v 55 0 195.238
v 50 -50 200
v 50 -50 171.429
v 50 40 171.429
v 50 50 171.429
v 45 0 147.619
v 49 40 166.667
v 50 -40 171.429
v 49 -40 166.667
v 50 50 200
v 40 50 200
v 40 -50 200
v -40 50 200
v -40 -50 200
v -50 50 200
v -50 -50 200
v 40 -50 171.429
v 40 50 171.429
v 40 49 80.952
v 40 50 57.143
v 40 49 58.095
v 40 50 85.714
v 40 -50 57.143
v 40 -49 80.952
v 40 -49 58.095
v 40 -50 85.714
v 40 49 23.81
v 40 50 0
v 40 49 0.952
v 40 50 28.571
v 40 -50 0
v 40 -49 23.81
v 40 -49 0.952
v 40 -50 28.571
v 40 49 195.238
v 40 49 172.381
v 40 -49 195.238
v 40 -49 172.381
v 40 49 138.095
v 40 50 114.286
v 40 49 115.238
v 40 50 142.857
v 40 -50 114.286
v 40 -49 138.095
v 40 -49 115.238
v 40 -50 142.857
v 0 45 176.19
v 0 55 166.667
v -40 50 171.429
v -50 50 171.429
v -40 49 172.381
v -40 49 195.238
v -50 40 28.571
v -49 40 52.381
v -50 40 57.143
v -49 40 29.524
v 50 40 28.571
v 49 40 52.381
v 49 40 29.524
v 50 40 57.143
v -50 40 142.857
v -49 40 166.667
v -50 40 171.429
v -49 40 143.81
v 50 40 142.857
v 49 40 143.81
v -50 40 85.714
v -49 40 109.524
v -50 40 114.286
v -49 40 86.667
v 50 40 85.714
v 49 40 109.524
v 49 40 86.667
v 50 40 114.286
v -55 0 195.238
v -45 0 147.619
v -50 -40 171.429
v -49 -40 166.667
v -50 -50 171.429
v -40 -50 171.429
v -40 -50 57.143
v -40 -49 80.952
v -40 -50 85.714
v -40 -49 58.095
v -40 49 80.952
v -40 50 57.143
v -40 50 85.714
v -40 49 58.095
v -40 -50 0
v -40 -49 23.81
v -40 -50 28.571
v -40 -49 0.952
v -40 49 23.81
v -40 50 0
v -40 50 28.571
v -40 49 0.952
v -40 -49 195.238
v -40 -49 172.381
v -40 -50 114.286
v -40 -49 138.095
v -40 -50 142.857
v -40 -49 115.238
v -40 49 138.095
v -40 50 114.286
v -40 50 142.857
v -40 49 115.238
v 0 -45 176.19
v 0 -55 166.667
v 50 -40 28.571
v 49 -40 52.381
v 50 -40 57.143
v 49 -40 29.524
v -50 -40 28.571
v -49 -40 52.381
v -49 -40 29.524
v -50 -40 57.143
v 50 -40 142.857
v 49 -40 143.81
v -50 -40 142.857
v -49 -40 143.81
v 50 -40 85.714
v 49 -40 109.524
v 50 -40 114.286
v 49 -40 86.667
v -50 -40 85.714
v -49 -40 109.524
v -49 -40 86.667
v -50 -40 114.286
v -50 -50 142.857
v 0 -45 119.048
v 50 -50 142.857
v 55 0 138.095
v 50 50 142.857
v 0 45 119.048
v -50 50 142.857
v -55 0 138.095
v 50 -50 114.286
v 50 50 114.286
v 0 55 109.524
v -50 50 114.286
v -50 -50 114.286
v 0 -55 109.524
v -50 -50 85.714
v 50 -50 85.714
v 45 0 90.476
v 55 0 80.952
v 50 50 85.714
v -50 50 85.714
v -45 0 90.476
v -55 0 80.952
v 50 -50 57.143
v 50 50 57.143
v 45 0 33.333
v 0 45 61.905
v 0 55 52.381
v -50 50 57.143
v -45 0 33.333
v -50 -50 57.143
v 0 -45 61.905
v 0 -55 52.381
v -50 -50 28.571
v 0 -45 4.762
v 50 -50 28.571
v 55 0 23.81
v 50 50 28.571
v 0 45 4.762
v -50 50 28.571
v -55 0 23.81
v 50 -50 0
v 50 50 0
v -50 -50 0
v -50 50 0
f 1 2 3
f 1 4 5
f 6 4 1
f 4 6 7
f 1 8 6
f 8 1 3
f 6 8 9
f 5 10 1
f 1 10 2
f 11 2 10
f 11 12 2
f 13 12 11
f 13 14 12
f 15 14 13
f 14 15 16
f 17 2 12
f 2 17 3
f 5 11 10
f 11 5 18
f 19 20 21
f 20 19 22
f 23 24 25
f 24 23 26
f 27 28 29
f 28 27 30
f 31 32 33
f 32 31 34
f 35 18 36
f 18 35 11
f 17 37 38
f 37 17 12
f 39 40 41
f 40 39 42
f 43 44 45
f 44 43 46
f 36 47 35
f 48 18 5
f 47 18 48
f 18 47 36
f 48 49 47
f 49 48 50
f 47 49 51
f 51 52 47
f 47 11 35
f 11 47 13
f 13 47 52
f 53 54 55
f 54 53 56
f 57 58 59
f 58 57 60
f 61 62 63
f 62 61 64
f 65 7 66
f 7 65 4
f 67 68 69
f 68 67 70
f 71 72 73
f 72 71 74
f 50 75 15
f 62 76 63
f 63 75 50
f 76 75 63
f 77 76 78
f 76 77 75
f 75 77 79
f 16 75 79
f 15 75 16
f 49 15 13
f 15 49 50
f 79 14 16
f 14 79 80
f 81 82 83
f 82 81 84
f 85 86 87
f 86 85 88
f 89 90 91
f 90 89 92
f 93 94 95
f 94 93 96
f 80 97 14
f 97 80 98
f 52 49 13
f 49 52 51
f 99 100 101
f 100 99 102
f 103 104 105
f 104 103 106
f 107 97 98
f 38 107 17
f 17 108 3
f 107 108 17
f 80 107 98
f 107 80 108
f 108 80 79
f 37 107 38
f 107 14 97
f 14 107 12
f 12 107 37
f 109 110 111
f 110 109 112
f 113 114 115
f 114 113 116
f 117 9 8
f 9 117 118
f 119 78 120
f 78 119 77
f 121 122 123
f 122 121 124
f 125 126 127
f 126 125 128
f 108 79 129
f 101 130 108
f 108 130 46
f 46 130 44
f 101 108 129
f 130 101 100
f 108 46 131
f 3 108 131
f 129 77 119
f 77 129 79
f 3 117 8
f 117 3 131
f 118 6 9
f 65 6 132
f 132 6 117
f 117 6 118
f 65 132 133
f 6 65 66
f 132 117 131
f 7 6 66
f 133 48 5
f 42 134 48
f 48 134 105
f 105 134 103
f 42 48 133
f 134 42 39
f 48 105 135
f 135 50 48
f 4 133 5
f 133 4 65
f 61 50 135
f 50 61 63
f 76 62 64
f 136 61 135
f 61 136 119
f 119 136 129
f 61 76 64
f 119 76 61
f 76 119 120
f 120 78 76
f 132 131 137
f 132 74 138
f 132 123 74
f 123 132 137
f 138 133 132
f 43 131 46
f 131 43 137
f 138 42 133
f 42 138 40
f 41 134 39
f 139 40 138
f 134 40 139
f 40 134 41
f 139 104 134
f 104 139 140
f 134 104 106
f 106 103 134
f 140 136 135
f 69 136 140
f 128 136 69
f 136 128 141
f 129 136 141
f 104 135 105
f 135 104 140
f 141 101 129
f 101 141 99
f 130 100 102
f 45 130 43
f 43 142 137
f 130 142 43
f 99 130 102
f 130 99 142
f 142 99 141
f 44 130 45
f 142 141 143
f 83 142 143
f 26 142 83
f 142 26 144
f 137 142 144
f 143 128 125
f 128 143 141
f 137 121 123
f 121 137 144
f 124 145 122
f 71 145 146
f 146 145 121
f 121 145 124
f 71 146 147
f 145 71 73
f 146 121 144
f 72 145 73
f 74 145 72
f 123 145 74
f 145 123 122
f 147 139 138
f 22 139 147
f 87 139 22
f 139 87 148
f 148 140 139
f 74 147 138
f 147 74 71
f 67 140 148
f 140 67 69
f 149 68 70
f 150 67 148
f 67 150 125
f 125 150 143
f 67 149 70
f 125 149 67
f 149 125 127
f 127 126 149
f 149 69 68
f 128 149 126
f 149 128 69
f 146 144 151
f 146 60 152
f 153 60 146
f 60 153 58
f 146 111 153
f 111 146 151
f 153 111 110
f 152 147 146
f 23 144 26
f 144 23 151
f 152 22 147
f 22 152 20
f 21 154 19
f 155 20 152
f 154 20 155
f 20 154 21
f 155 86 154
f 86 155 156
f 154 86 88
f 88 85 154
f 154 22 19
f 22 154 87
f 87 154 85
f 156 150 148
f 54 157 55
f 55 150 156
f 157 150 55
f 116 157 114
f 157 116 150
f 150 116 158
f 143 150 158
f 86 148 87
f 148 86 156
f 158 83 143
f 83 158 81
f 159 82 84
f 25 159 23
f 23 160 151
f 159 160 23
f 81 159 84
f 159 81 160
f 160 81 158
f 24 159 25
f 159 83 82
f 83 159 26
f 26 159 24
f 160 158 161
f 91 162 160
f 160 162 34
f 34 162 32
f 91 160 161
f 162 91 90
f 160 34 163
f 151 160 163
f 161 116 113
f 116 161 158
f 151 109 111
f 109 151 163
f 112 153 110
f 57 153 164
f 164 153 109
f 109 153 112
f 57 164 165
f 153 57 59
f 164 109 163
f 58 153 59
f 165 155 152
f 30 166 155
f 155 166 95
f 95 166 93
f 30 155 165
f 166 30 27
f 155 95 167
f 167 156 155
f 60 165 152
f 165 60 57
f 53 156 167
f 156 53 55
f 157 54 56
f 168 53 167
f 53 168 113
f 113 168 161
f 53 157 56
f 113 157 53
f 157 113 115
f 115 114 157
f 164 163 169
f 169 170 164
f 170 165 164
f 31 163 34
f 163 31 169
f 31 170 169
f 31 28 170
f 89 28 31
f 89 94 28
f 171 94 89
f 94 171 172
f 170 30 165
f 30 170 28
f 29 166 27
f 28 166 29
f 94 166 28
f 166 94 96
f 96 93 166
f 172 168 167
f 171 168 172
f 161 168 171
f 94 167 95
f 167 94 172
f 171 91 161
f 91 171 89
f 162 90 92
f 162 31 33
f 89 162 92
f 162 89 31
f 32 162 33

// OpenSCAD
radius = 50;// Approximate radius of lampshade body.
height = 200;// Height of the lamp body
layers = 7; // Number of layers
cells_per_layer = 4; // Number of cells per layer

// Ratio of lump in cell. Ratio: 1/socket_ratio
cell_lump_height_ratio = 6;
// Depth of the lumpos. r/cell_lump_depth_ratio
cell_lump_depth_ratio = 10;

bholediameter = 50;// Hole in the bottom to mount the lamp:
bholeheight = 0.8;// For vase mode, set bholeheight to the same setting as the bottom layer.

// Height-ratio of socket to shade. Ratio: 1/socket_ratio
socket_ratio = 7.3;

//---------------------------- internal stuff below, change at your own risk ----------------------------//

cell_angle = 360 / (cells_per_layer / 2); // Degrees by which each cell is rotated, relative to the last one of its type
cell_width = radius * tan(cell_angle / 4);
cell_depth = -10; // Depth of the polyhedron (but only the cuboid part, without the dent)
cell_height = height / layers;
cell_lump = cell_height / cell_lump_height_ratio;

cylinder_rotation = (cells_per_layer % 4 == 0) ?
    (360 / cells_per_layer / 2) :
        ((cells_per_layer % 4 == 2) ? 0 : -90);

cylinder_radius = (radius + cell_depth) / cos(180 / cells_per_layer);

// Stuff for the slanted top where shade and socket come together
//cone_radius = radius + ((socket_ratio - 1) * height / socket_ratio / tan(60));
cone_height = height / socket_ratio + tan(60) * (radius - height / socket_ratio / tan(60));

// Coordinates of vertices that describe the polyhedron with the outward facing lump
p1 = [
        [cell_width, 0, 0], //0
        [-cell_width, 0, 0], //1
        [-cell_width, 0, cell_height], //2
        [cell_width, 0, cell_height], //3
        [0, radius / cell_lump_depth_ratio, cell_lump], //4
        [cell_width, cell_depth, 0], //5
        [-cell_width, cell_depth, 0], //6
        [-cell_width, cell_depth, cell_height], //7
        [cell_width, cell_depth, cell_height], //8
    ];

// Coordinates of vertices that describe the polyhedron with the inward facing lump
p2 = [
        [cell_width, 0, 0], //0
        [-cell_width, 0, 0], //1
        [-cell_width, 0, cell_height], //2
        [cell_width, 0, cell_height], //3
        [0, -radius / cell_lump_depth_ratio, cell_height - cell_lump], //4
        [cell_width, cell_depth, 0], //5
        [-cell_width, cell_depth, 0], //6
        [-cell_width, cell_depth, cell_height], //7
        [cell_width, cell_depth, cell_height], //8
    ];

// Vertices that the faces should connect
faces = [
        [1, 2, 4],
        [2, 3, 4],
        [0, 4, 3],
        [0, 1, 4],
        [0, 5, 6, 1],
        [1, 6, 7, 2],
        [3, 2, 7, 8],
        [0, 3, 8, 5],
        [8, 7, 6, 5]
    ];

module placeCell(rotation, vertices, height) {
    translate([sin(rotation) * radius, cos(rotation) * radius, height]) {
        // Single segment
        rotate([0, 0, -rotation])
            polyhedron(vertices, faces, 4);
    }
}

module placeLayer(current_z, offset) {
    for (current_degree = [0:cell_angle / 2:360]) {

        // Every other iteration
        if ((current_degree / cell_angle) % 1 == 0) {
            placeCell(current_degree + offset, p1, current_z);
        } else {
            placeCell(current_degree + offset, p2, current_z);
        }
    }
}

module wholeShade() {
    translate([0, 0, height])
        rotate([180, 0, 0])
            union() {
                rotate([0, 0, cylinder_rotation])
                    cylinder(r = cylinder_radius, h = height, $fn = cells_per_layer);

                for (i = [0:1:layers - 1]) {
                    current_z = i * cell_height;
                    // Every other iteration
                    if (i % 2 == 0) {
                        placeLayer(current_z, cell_angle / 2);
                    } else {
                        placeLayer(current_z, 0);
                    }
                }
            }
}

module shadeForSocket() {
    intersection() {
        cylinder(h = cone_height, r1 = cone_radius, r2 = 0);
        intersection() {
            wholeShade();
            cylinder(r = radius * (11 / 10), h = height * (9 / 10));
        }
    }
}

module socketForShade() {
    difference() {
        wholeShade();
        shadeForSocket();
        cylinder(h = height, d = bholediameter);
    }
}


//cylinder(h = cone_height, r1 = cone_radius, r2 = 0);
//color("red") shadeForSocket();
//color("green") socketForShade();
wholeShade();

//polyhedron(p1, faces, 4);

//translate([0, 0, height - height / socket_ratio])
//    cylinder(h = cone_height, r1 = radius, r2 = 0, $fn = cells_per_layer);

//rotate([0, 0, cylinder_rotation])
//    cylinder(r = radius, h = height, $fn = cells_per_layer);
//placeLayer(0, 0);
